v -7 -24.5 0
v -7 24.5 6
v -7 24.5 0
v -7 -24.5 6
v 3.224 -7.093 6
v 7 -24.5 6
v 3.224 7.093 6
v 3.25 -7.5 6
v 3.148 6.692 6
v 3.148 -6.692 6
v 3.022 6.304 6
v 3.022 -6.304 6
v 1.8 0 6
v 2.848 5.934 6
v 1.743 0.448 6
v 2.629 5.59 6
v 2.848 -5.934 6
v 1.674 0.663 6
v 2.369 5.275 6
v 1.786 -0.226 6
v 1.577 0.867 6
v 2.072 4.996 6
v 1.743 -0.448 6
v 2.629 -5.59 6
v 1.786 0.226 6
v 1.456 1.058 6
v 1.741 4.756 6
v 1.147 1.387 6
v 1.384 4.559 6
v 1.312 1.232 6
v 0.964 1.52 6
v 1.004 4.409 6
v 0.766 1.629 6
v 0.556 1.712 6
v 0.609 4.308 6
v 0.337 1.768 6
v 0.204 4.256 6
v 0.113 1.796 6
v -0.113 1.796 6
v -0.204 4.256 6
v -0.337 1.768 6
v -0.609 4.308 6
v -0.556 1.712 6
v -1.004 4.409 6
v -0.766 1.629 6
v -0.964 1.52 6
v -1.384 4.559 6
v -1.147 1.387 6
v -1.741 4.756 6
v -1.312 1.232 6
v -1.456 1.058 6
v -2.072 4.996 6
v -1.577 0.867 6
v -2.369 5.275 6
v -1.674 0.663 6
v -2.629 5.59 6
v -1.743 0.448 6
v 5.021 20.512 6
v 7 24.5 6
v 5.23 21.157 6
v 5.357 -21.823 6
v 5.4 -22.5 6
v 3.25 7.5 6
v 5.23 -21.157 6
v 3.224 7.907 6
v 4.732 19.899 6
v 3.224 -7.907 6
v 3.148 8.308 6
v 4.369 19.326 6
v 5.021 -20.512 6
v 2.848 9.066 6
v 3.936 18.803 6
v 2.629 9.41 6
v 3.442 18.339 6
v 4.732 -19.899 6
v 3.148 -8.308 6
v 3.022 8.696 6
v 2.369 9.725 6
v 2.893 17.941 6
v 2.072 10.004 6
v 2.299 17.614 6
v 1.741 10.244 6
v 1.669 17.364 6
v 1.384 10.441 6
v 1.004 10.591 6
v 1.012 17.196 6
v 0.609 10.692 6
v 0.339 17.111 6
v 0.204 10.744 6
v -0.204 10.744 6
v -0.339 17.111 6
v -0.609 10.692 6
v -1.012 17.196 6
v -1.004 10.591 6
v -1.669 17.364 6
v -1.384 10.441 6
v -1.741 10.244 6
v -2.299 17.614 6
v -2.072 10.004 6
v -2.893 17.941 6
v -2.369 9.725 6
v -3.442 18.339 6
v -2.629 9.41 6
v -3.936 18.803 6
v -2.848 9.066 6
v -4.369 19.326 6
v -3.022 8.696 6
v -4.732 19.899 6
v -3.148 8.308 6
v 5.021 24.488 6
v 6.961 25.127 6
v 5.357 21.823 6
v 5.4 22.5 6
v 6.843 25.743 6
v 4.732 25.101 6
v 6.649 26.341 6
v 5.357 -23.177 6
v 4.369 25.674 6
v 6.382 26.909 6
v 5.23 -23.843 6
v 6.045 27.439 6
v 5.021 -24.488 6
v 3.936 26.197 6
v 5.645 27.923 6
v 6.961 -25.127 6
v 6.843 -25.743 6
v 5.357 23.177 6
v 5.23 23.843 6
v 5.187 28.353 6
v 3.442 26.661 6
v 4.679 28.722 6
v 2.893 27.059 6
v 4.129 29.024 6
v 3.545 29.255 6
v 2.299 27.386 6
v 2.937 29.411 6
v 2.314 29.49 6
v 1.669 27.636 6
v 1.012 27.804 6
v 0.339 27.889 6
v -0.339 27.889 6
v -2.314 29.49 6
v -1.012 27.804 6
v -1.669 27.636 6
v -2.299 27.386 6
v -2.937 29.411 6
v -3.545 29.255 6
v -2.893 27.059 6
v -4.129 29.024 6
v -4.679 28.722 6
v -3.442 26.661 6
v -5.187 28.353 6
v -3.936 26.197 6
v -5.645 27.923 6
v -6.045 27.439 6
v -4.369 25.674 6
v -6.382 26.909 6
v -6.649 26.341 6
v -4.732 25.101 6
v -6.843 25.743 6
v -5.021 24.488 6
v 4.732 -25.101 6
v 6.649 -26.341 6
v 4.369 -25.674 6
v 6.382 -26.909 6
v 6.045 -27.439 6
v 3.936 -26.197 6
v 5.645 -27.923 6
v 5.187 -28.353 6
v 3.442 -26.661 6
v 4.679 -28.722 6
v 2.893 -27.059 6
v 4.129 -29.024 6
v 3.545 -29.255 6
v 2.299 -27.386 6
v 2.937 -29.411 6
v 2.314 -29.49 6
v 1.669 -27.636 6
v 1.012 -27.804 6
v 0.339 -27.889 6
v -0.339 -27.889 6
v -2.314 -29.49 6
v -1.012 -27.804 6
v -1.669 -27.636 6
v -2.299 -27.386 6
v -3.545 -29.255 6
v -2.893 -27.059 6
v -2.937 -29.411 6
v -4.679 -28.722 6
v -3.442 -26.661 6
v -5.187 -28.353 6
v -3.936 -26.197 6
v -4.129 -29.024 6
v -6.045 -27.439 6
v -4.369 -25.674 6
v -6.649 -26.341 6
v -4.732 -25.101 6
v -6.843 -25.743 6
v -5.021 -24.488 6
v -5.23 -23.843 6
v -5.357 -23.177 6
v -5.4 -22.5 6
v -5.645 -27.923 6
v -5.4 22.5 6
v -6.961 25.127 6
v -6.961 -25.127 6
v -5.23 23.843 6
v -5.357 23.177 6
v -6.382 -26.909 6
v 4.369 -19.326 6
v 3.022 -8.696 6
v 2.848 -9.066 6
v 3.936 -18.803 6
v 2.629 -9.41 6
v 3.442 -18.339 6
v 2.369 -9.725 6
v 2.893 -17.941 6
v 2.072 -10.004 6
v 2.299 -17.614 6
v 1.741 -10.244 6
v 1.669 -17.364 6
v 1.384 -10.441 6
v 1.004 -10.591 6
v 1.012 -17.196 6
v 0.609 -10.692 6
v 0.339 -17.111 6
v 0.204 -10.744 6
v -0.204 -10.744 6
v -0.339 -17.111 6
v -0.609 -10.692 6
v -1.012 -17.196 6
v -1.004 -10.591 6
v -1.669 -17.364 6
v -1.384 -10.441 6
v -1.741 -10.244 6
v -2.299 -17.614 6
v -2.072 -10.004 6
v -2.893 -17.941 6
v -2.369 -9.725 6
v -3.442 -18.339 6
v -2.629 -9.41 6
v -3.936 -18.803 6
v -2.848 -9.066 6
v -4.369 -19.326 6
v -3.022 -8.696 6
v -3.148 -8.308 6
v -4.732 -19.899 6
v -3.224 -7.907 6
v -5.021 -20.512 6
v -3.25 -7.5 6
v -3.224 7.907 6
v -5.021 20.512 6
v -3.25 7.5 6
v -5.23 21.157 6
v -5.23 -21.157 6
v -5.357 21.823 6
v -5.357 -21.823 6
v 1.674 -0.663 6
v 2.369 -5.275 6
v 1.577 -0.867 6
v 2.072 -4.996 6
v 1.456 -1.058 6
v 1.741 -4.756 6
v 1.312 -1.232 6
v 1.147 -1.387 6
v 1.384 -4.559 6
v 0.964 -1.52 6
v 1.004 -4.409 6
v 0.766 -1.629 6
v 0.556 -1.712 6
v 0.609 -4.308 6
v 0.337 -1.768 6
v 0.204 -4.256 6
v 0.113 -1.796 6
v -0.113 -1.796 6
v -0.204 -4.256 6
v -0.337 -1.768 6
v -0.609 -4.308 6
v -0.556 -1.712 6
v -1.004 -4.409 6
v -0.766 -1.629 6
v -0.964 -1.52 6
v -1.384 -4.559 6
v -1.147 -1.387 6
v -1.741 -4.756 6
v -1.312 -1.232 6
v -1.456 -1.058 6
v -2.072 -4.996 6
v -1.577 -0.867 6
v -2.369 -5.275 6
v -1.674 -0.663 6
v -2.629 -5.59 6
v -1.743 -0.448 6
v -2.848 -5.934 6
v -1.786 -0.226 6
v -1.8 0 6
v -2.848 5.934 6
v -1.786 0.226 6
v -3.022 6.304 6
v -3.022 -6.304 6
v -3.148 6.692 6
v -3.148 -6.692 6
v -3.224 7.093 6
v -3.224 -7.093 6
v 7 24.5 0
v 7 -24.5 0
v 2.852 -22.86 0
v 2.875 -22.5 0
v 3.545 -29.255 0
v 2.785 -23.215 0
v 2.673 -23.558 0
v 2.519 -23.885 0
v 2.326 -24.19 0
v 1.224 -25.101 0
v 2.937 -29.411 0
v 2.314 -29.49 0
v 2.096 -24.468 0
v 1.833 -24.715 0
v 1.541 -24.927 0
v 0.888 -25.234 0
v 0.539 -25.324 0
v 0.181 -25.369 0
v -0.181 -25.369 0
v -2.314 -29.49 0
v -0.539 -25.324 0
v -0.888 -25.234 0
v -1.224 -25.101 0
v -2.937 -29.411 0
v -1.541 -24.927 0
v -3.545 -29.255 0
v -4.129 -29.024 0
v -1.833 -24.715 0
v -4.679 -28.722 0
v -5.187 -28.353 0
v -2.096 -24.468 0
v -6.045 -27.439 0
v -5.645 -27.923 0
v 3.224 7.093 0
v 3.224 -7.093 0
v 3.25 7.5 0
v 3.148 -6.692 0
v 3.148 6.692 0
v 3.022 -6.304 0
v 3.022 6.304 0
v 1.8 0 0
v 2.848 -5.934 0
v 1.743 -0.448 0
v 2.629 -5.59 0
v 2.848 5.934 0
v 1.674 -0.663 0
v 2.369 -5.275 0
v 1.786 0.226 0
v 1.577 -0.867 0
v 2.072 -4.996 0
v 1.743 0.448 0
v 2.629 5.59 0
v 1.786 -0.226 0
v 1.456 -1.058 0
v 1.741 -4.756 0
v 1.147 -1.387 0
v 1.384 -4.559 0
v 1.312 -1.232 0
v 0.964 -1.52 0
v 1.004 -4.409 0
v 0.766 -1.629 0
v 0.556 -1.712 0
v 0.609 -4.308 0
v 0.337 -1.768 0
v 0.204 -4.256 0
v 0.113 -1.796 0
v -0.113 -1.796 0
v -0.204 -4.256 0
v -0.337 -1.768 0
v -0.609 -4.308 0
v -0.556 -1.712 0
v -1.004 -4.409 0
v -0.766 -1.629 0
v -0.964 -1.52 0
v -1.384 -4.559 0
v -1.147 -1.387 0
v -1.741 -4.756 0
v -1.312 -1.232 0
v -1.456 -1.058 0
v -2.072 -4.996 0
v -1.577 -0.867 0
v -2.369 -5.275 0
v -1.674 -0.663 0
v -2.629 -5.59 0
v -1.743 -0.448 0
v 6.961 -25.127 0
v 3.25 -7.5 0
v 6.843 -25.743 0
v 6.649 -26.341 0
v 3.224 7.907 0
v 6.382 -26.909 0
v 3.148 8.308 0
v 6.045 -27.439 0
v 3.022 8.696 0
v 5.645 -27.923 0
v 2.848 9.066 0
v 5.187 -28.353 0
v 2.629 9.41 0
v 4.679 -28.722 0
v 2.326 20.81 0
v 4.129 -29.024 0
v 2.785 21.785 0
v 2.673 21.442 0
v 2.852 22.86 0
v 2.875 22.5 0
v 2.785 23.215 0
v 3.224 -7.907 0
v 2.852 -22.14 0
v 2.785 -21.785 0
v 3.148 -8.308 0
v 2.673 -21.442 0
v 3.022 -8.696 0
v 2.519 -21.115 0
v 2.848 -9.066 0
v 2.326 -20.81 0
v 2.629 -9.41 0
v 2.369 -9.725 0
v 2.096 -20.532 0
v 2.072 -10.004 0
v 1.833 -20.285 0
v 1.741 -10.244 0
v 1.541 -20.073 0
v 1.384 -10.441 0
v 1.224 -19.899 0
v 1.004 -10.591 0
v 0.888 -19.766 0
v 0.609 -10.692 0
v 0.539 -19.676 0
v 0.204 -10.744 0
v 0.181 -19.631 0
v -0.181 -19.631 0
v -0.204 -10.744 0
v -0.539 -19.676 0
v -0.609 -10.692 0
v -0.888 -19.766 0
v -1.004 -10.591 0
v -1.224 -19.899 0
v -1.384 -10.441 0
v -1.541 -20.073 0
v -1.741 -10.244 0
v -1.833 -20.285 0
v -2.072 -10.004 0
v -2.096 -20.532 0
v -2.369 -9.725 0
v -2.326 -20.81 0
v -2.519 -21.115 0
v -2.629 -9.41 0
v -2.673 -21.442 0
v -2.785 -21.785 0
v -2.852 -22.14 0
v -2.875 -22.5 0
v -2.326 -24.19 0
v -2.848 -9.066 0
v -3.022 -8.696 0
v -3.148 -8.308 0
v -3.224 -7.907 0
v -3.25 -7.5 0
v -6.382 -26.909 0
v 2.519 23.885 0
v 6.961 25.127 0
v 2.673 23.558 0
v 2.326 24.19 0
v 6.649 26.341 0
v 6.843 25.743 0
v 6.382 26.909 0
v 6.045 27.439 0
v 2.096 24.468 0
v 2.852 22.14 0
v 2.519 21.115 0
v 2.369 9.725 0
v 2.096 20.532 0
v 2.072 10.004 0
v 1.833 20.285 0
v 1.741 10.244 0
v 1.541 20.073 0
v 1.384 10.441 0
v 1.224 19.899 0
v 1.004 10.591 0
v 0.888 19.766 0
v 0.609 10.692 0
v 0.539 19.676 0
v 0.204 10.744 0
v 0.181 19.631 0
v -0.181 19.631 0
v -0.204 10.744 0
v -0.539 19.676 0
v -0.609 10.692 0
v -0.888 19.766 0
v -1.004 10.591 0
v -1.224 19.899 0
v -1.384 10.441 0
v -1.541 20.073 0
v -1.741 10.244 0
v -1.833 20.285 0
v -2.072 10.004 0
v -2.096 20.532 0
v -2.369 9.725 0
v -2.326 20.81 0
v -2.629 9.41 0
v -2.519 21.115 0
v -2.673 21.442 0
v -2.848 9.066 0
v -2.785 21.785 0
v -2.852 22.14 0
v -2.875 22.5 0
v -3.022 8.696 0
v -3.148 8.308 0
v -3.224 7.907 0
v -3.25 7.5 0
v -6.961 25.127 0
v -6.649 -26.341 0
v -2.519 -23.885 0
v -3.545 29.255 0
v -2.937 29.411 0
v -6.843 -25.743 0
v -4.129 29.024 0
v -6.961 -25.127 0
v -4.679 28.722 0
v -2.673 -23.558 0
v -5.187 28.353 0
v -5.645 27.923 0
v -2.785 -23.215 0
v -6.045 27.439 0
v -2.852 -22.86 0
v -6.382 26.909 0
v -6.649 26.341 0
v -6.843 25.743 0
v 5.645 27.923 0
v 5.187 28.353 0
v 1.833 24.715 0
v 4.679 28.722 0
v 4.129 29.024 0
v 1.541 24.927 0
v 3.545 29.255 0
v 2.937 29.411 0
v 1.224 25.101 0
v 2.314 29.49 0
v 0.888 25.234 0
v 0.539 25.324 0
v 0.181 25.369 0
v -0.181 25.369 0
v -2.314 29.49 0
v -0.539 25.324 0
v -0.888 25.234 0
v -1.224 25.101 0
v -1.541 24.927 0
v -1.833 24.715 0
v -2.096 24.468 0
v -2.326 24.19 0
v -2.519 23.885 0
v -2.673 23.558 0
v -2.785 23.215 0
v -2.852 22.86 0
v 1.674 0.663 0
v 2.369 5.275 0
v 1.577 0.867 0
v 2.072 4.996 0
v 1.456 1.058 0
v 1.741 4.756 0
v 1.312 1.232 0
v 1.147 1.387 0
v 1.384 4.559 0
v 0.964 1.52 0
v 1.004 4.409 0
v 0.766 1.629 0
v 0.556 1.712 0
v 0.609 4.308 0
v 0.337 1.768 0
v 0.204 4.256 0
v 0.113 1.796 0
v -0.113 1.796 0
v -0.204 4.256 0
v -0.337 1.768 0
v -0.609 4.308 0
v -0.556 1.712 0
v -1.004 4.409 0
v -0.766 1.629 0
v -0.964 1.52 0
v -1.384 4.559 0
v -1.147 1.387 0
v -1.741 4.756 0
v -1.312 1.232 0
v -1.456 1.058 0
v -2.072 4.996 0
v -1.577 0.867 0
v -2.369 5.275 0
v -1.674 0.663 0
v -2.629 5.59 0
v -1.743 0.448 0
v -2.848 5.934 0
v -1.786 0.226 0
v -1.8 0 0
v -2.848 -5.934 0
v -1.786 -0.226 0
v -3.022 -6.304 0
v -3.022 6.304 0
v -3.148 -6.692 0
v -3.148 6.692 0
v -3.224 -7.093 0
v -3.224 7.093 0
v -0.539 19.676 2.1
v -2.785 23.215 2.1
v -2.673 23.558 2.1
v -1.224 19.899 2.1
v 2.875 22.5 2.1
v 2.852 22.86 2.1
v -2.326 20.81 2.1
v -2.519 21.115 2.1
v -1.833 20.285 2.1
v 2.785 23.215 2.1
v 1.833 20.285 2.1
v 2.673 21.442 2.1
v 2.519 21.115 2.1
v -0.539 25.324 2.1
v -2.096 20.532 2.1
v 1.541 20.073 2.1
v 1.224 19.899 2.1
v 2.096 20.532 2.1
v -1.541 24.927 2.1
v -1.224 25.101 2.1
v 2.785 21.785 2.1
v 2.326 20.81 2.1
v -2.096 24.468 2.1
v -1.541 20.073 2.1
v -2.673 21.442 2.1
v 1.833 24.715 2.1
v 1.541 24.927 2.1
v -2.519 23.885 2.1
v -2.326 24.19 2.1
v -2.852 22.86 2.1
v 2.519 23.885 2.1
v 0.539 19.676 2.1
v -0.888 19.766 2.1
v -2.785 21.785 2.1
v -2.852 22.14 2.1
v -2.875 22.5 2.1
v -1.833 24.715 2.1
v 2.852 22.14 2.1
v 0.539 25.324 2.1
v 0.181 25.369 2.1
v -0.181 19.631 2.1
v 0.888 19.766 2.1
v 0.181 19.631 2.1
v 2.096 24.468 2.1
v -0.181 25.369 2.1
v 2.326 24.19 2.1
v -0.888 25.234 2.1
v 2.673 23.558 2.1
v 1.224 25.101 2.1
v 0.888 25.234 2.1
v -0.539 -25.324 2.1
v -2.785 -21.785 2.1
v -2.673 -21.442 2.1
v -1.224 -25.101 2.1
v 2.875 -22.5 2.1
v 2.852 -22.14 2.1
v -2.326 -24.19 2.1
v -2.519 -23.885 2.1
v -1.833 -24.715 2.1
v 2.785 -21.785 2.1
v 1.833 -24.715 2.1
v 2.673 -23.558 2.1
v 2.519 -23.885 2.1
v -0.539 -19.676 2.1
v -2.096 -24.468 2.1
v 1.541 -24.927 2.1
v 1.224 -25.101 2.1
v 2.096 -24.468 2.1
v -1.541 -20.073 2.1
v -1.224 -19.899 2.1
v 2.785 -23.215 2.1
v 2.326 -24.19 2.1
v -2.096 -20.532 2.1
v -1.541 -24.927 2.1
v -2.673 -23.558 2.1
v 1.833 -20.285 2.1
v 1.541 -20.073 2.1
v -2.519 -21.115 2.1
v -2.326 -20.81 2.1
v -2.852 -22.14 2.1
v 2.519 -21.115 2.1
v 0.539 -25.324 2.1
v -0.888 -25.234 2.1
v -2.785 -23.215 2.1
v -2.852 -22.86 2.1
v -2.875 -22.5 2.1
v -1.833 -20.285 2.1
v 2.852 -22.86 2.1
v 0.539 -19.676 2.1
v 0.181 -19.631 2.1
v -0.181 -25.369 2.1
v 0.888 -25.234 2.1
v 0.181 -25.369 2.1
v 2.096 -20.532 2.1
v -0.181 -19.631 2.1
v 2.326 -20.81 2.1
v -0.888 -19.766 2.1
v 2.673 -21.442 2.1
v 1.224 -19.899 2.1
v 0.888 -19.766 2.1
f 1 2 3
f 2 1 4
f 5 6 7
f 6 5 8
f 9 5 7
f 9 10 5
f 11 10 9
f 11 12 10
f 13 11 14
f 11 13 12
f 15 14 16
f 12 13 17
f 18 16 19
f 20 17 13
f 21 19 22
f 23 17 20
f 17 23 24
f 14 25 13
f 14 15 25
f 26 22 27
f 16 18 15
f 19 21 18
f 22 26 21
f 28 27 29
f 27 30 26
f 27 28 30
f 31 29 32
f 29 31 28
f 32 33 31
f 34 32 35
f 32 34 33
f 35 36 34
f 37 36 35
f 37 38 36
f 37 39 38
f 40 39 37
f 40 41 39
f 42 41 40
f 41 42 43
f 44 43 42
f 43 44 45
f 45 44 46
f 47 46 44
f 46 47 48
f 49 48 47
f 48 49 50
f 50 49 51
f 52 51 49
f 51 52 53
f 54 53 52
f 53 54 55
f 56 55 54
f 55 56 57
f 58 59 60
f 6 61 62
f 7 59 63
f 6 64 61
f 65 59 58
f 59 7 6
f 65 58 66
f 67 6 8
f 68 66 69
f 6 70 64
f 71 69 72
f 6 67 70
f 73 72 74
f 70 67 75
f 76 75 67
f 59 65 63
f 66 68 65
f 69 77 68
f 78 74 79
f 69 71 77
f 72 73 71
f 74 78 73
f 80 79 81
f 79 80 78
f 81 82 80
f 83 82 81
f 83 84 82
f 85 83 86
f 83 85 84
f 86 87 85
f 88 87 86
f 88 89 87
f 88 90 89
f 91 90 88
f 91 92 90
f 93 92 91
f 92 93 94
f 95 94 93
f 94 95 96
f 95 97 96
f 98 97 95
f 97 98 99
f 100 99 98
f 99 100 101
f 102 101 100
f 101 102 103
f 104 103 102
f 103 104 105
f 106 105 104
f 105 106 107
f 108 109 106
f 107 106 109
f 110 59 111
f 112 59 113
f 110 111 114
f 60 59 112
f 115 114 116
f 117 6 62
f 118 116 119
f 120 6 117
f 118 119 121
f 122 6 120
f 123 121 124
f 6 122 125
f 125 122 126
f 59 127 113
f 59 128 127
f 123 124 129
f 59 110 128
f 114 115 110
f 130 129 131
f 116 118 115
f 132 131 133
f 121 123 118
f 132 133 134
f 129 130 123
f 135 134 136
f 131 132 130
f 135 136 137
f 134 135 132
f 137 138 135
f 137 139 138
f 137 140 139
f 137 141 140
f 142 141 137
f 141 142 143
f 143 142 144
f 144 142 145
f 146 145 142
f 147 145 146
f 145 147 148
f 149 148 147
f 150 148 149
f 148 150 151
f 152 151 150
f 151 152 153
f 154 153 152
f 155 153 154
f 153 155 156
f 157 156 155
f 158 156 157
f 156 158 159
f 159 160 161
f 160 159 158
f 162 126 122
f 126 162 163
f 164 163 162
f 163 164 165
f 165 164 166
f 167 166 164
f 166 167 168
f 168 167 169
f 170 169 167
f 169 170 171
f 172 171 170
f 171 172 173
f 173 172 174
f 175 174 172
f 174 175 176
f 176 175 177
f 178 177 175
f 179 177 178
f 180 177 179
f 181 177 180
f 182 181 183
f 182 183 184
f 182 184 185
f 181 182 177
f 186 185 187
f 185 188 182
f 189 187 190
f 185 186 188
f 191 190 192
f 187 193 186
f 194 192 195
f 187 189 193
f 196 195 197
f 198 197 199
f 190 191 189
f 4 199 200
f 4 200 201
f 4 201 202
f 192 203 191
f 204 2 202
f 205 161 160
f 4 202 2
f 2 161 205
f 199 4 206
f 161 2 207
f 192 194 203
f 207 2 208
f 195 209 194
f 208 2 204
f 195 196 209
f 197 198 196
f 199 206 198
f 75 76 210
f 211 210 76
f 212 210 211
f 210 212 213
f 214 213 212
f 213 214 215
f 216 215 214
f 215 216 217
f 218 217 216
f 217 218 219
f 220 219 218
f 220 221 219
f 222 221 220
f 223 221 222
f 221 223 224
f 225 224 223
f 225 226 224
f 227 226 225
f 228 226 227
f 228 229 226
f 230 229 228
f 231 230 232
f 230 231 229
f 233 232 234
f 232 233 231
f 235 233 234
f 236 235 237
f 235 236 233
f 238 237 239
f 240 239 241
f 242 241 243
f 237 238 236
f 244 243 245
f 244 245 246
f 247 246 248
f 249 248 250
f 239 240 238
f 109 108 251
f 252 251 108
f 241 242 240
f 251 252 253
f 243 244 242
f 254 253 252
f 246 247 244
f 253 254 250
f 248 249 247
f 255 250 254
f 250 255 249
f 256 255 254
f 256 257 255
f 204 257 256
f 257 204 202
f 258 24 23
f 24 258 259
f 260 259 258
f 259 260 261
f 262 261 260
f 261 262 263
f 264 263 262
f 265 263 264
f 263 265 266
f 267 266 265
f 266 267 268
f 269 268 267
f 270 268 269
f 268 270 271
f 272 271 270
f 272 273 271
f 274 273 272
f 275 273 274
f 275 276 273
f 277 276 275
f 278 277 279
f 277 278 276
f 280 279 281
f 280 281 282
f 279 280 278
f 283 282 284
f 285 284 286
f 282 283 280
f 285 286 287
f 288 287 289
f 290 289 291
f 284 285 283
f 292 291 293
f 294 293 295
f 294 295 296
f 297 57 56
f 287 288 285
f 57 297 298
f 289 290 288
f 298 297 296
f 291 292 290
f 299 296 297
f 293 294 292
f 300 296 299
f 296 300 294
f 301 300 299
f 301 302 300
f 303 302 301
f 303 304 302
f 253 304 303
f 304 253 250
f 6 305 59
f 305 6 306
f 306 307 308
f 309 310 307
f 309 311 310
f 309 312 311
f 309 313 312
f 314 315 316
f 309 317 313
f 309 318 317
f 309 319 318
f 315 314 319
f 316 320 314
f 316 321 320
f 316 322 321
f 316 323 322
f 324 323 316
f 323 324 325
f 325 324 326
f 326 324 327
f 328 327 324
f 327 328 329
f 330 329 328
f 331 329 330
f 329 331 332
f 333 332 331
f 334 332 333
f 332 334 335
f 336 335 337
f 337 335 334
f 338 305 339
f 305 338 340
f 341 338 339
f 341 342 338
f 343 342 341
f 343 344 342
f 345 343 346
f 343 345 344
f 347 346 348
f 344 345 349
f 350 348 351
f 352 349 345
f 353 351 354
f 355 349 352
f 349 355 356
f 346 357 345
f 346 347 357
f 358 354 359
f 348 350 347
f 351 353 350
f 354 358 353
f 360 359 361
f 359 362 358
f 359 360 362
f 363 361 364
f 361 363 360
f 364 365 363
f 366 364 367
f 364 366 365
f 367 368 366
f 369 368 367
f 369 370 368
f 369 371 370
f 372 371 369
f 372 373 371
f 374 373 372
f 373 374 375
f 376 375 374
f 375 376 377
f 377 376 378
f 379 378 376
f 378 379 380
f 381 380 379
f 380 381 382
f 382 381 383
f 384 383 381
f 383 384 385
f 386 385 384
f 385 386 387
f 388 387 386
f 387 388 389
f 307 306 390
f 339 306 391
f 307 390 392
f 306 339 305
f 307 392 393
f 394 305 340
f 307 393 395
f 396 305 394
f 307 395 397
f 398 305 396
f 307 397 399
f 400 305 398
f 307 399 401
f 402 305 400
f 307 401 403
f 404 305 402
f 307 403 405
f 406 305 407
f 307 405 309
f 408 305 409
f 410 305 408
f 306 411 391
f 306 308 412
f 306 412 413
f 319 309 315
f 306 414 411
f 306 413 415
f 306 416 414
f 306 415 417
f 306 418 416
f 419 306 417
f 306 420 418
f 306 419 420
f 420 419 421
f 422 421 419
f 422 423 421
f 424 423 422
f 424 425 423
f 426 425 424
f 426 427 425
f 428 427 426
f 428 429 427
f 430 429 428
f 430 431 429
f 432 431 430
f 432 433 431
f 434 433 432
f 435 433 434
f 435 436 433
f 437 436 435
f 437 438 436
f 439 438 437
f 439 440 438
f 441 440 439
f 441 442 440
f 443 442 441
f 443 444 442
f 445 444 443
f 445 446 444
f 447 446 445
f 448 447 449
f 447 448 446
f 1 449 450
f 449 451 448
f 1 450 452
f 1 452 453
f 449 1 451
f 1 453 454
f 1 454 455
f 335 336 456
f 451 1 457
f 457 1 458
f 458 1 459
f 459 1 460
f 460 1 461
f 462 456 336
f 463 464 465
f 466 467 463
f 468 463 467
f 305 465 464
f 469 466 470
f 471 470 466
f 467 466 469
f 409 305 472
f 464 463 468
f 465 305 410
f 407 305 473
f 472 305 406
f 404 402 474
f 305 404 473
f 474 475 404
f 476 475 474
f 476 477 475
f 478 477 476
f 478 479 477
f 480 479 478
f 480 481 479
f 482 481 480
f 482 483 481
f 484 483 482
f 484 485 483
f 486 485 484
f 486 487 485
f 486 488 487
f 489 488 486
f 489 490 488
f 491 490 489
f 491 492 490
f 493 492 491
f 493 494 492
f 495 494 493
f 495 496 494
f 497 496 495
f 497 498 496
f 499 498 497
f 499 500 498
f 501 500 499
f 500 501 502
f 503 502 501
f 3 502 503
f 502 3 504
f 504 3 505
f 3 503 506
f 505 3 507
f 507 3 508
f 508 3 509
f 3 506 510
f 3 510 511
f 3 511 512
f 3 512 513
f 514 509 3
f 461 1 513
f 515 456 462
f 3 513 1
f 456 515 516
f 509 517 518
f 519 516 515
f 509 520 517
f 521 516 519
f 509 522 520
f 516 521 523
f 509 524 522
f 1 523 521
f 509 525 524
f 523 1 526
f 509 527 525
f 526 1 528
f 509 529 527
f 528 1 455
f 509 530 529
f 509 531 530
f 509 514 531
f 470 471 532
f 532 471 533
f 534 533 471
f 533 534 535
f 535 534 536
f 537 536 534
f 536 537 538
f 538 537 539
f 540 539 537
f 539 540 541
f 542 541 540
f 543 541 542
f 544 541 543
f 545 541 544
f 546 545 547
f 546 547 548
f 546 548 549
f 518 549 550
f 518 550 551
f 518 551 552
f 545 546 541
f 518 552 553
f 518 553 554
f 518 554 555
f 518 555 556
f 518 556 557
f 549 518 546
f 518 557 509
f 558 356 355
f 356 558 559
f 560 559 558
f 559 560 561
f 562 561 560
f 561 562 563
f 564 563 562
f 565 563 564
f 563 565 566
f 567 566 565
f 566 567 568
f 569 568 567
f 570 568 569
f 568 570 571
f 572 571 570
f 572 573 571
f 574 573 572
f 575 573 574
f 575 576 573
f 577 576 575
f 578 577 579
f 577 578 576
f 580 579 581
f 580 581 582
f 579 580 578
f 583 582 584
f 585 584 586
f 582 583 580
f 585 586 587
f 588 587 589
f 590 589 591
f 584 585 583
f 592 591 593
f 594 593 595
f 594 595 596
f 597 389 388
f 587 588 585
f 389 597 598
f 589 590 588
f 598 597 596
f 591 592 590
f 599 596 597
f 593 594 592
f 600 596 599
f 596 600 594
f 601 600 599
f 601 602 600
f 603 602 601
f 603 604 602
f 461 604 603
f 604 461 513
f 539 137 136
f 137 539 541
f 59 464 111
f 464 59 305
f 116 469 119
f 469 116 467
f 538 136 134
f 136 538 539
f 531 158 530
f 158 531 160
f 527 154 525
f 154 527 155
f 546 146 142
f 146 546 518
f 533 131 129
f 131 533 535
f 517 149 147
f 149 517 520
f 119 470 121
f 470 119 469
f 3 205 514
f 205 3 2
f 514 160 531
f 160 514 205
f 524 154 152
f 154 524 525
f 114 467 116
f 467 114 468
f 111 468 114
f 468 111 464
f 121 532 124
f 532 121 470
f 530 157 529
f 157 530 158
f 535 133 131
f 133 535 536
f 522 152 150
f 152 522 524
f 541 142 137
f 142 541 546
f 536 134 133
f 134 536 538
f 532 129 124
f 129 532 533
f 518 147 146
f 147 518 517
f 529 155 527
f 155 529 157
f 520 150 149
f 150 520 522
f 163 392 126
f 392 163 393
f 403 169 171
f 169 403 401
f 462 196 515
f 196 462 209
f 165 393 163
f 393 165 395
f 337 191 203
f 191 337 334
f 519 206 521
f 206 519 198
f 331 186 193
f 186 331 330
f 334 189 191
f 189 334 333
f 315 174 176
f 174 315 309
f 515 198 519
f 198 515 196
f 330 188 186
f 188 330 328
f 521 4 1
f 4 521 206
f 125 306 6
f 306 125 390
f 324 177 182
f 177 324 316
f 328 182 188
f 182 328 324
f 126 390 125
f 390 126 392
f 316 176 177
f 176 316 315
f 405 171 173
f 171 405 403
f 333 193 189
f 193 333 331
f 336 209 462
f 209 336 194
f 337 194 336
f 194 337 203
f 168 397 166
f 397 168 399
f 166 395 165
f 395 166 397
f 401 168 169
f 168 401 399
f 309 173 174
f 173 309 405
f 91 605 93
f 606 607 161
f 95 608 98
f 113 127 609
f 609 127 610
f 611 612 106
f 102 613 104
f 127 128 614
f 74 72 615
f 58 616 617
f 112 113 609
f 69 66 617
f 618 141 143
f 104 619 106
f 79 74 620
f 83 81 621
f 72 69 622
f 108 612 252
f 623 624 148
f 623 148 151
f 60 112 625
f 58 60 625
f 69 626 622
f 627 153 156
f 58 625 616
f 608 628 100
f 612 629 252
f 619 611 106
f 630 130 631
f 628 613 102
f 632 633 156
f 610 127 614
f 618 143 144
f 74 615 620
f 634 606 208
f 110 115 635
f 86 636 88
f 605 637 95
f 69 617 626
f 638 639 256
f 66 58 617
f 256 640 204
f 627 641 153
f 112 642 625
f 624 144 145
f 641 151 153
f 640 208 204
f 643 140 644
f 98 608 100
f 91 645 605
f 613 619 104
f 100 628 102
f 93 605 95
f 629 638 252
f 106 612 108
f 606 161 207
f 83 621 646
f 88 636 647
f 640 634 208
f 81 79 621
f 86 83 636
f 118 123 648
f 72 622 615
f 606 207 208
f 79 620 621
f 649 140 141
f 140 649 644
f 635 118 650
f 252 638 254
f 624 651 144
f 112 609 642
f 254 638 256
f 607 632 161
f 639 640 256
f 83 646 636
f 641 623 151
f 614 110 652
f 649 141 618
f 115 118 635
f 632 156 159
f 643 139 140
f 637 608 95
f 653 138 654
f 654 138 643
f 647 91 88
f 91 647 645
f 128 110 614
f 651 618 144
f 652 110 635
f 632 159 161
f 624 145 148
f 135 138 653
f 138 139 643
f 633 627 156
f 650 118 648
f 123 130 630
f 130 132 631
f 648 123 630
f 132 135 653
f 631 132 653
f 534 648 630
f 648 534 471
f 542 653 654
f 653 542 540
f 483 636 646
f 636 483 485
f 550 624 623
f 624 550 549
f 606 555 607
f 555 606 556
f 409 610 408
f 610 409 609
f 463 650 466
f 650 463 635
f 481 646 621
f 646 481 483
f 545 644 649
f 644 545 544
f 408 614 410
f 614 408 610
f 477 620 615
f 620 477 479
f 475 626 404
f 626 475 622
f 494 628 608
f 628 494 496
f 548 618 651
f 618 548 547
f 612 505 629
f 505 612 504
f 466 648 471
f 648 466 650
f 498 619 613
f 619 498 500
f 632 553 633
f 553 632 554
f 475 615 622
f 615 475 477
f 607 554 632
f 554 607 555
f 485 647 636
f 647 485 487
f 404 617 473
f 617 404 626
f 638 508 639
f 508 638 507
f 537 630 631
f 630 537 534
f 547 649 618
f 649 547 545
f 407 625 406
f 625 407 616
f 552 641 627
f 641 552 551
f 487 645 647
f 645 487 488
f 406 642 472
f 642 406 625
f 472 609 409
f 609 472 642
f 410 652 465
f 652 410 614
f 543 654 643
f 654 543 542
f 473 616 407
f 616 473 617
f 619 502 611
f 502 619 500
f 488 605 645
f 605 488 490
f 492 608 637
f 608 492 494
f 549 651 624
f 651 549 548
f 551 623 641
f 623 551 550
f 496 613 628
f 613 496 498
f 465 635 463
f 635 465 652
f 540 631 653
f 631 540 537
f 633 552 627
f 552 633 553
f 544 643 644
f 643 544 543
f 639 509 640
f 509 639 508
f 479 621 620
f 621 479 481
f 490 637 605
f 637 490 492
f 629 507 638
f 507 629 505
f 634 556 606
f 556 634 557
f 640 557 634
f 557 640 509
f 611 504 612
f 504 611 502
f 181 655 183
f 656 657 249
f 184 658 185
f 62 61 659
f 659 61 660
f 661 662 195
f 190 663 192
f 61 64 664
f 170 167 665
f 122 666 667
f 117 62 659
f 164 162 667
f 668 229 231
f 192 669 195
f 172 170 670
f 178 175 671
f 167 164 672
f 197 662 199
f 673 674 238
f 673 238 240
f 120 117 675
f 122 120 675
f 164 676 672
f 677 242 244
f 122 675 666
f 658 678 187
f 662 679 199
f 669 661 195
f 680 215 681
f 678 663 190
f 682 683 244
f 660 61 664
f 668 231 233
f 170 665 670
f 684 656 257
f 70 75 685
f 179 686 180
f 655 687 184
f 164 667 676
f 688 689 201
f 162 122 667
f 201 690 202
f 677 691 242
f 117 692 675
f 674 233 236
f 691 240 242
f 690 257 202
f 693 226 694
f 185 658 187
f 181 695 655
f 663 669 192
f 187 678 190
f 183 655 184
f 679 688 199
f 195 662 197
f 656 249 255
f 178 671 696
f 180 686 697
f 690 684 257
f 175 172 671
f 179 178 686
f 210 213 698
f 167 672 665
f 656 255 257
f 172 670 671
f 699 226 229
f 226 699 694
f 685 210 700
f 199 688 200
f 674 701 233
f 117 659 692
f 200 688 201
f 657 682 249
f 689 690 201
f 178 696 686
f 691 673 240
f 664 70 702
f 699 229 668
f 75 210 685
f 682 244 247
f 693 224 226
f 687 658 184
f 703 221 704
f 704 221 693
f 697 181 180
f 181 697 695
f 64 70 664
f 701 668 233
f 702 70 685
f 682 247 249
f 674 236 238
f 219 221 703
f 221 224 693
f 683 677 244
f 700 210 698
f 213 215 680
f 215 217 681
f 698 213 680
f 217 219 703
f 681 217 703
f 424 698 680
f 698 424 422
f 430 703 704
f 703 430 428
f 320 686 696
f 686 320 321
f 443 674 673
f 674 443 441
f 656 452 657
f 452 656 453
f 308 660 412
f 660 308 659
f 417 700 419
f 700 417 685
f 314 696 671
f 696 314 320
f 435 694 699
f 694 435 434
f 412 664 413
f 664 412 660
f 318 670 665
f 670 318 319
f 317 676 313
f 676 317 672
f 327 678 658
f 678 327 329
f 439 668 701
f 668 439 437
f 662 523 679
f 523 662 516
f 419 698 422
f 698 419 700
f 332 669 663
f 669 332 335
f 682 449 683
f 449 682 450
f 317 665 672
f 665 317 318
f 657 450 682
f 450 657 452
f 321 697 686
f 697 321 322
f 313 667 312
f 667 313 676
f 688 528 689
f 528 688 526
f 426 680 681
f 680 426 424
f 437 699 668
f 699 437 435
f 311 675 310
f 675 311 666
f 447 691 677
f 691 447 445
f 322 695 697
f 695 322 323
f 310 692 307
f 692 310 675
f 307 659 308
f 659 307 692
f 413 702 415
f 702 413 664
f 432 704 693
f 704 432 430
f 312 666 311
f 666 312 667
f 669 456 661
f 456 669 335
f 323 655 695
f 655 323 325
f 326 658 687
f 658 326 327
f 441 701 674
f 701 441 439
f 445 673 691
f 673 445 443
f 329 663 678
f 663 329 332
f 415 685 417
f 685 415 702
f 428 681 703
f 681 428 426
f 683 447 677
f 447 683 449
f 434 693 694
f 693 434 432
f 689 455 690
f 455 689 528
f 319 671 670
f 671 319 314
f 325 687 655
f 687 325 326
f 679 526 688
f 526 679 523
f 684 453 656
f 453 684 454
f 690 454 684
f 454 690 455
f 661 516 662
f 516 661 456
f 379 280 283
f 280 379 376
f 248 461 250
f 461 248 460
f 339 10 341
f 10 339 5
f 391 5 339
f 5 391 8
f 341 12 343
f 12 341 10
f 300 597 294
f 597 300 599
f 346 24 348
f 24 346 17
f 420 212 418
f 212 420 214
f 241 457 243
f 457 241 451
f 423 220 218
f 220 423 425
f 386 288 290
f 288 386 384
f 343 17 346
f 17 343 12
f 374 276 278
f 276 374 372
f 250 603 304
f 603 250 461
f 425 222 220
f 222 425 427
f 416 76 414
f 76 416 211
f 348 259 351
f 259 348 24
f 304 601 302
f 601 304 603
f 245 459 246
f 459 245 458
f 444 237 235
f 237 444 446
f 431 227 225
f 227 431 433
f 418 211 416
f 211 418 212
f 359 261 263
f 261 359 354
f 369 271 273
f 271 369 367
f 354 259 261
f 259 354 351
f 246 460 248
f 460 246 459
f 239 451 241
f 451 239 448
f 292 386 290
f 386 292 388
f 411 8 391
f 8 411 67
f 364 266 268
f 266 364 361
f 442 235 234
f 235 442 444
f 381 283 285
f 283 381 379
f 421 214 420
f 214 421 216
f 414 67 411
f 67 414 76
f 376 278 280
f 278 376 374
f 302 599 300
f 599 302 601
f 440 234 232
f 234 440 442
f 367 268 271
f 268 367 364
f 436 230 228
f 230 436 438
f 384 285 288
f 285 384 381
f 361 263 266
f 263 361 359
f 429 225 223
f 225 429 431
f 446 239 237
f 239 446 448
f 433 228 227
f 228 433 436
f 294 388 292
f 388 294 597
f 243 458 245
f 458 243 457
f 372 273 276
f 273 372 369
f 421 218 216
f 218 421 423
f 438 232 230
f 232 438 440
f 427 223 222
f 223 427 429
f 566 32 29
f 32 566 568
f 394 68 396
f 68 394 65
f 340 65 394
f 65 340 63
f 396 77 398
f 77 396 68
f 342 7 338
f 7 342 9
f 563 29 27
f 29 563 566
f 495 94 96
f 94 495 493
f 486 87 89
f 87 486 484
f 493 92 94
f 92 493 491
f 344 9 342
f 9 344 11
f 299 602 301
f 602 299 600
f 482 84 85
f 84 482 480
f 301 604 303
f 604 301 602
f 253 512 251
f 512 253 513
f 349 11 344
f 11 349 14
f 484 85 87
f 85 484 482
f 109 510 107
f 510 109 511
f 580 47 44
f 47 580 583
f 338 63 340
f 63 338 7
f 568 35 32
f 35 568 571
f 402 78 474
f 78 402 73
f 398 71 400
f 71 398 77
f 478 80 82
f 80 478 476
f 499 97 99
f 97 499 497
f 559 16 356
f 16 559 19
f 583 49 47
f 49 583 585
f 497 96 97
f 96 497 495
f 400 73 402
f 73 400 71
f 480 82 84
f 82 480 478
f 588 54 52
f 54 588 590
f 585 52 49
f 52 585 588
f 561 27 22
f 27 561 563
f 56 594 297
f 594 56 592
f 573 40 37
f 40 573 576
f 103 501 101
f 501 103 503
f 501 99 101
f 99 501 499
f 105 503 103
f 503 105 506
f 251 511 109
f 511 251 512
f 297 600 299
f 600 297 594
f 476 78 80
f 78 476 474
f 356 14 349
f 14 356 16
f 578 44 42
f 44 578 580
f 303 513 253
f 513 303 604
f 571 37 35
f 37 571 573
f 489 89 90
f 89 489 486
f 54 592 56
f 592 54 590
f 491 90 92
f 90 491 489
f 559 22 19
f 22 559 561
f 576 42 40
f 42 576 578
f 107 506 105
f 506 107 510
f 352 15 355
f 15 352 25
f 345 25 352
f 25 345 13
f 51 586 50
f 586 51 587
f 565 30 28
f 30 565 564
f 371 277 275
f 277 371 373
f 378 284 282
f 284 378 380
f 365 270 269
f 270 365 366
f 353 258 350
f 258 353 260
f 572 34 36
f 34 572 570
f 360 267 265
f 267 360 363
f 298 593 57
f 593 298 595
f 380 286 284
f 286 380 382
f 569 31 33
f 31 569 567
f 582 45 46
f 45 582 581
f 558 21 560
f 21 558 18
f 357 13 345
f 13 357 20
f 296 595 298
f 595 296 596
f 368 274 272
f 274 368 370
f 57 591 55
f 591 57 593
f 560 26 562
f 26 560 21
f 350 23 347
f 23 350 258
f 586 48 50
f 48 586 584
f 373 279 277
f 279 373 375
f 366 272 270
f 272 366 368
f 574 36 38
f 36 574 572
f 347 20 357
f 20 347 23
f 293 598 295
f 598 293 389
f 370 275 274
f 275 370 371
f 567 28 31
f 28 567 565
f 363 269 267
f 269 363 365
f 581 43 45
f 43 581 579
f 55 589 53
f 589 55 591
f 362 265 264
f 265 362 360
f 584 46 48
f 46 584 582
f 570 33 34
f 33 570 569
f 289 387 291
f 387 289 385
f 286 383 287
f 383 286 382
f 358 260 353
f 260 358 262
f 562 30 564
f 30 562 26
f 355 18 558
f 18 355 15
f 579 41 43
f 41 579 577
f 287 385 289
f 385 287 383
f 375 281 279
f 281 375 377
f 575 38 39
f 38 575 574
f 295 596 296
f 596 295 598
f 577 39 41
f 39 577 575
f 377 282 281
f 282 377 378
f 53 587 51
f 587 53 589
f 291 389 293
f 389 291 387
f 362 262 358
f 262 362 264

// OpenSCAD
$fn = 50;


difference() {
	union() {
		hull() {
			translate(v = [-2.0000000000, 9.5000000000, 0]) {
				cylinder(h = 6, r = 5);
			}
			translate(v = [2.0000000000, 9.5000000000, 0]) {
				cylinder(h = 6, r = 5);
			}
			translate(v = [-2.0000000000, -9.5000000000, 0]) {
				cylinder(h = 6, r = 5);
			}
			translate(v = [2.0000000000, -9.5000000000, 0]) {
				cylinder(h = 6, r = 5);
			}
		}
		translate(v = [0.0000000000, 15.0000000000, 0]) {
			hull() {
				translate(v = [-2.0000000000, 9.5000000000, 0]) {
					cylinder(h = 6, r = 5);
				}
				translate(v = [2.0000000000, 9.5000000000, 0]) {
					cylinder(h = 6, r = 5);
				}
				translate(v = [-2.0000000000, -9.5000000000, 0]) {
					cylinder(h = 6, r = 5);
				}
				translate(v = [2.0000000000, -9.5000000000, 0]) {
					cylinder(h = 6, r = 5);
				}
			}
		}
		translate(v = [0.0000000000, 15.0000000000, 0]) {
			hull() {
				translate(v = [-2.0000000000, 9.5000000000, 0]) {
					cylinder(h = 6, r = 5);
				}
				translate(v = [2.0000000000, 9.5000000000, 0]) {
					cylinder(h = 6, r = 5);
				}
				translate(v = [-2.0000000000, -9.5000000000, 0]) {
					cylinder(h = 6, r = 5);
				}
				translate(v = [2.0000000000, -9.5000000000, 0]) {
					cylinder(h = 6, r = 5);
				}
			}
		}
		translate(v = [0.0000000000, -15.0000000000, 0]) {
			hull() {
				translate(v = [-2.0000000000, 9.5000000000, 0]) {
					cylinder(h = 6, r = 5);
				}
				translate(v = [2.0000000000, 9.5000000000, 0]) {
					cylinder(h = 6, r = 5);
				}
				translate(v = [-2.0000000000, -9.5000000000, 0]) {
					cylinder(h = 6, r = 5);
				}
				translate(v = [2.0000000000, -9.5000000000, 0]) {
					cylinder(h = 6, r = 5);
				}
			}
		}
		translate(v = [0.0000000000, -15.0000000000, 0]) {
			hull() {
				translate(v = [-2.0000000000, 9.5000000000, 0]) {
					cylinder(h = 6, r = 5);
				}
				translate(v = [2.0000000000, 9.5000000000, 0]) {
					cylinder(h = 6, r = 5);
				}
				translate(v = [-2.0000000000, -9.5000000000, 0]) {
					cylinder(h = 6, r = 5);
				}
				translate(v = [2.0000000000, -9.5000000000, 0]) {
					cylinder(h = 6, r = 5);
				}
			}
		}
	}
	union() {
		translate(v = [0.0000000000, 22.5000000000, 6]) {
			rotate(a = [0, 0, 0]) {
				difference() {
					union() {
						#translate(v = [0, 0, -6.0000000000]) {
							cylinder(h = 6, r = 2.6000000000);
						}
						#translate(v = [0, 0, -3.9000000000]) {
							cylinder(h = 3.9000000000, r1 = 2.8750000000, r2 = 5.4000000000);
						}
						#translate(v = [0, 0, -6.0000000000]) {
							cylinder(h = 6, r = 2.8750000000);
						}
						#translate(v = [0, 0, -6.0000000000]) {
							cylinder(h = 6, r = 2.6000000000);
						}
					}
					union();
				}
			}
		}
		translate(v = [0.0000000000, 22.5000000000, 6]) {
			rotate(a = [0, 0, 0]) {
				difference() {
					union() {
						#translate(v = [0, 0, -6.0000000000]) {
							cylinder(h = 6, r = 2.6000000000);
						}
						#translate(v = [0, 0, -3.9000000000]) {
							cylinder(h = 3.9000000000, r1 = 2.8750000000, r2 = 5.4000000000);
						}
						#translate(v = [0, 0, -6.0000000000]) {
							cylinder(h = 6, r = 2.8750000000);
						}
						#translate(v = [0, 0, -6.0000000000]) {
							cylinder(h = 6, r = 2.6000000000);
						}
					}
					union();
				}
			}
		}
		translate(v = [0.0000000000, -22.5000000000, 6]) {
			rotate(a = [0, 0, 0]) {
				difference() {
					union() {
						#translate(v = [0, 0, -6.0000000000]) {
							cylinder(h = 6, r = 2.6000000000);
						}
						#translate(v = [0, 0, -3.9000000000]) {
							cylinder(h = 3.9000000000, r1 = 2.8750000000, r2 = 5.4000000000);
						}
						#translate(v = [0, 0, -6.0000000000]) {
							cylinder(h = 6, r = 2.8750000000);
						}
						#translate(v = [0, 0, -6.0000000000]) {
							cylinder(h = 6, r = 2.6000000000);
						}
					}
					union();
				}
			}
		}
		translate(v = [0.0000000000, -22.5000000000, 6]) {
			rotate(a = [0, 0, 0]) {
				difference() {
					union() {
						#translate(v = [0, 0, -6.0000000000]) {
							cylinder(h = 6, r = 2.6000000000);
						}
						#translate(v = [0, 0, -3.9000000000]) {
							cylinder(h = 3.9000000000, r1 = 2.8750000000, r2 = 5.4000000000);
						}
						#translate(v = [0, 0, -6.0000000000]) {
							cylinder(h = 6, r = 2.8750000000);
						}
						#translate(v = [0, 0, -6.0000000000]) {
							cylinder(h = 6, r = 2.6000000000);
						}
					}
					union();
				}
			}
		}
		translate(v = [0.0000000000, -7.5000000000, 0]) {
			translate(v = [0, 0, -100]) {
				cylinder(h = 200, r = 3.2500000000);
			}
		}
		translate(v = [0.0000000000, 7.5000000000, 0]) {
			translate(v = [0, 0, -100]) {
				cylinder(h = 200, r = 3.2500000000);
			}
		}
		translate(v = [0.0000000000, -7.5000000000, 0]) {
			translate(v = [0, 0, -100]) {
				cylinder(h = 200, r = 1.8000000000);
			}
		}
		translate(v = [0, 0, -100]) {
			cylinder(h = 200, r = 1.8000000000);
		}
		translate(v = [0.0000000000, 7.5000000000, 0]) {
			translate(v = [0, 0, -100]) {
				cylinder(h = 200, r = 1.8000000000);
			}
		}
	}
}
